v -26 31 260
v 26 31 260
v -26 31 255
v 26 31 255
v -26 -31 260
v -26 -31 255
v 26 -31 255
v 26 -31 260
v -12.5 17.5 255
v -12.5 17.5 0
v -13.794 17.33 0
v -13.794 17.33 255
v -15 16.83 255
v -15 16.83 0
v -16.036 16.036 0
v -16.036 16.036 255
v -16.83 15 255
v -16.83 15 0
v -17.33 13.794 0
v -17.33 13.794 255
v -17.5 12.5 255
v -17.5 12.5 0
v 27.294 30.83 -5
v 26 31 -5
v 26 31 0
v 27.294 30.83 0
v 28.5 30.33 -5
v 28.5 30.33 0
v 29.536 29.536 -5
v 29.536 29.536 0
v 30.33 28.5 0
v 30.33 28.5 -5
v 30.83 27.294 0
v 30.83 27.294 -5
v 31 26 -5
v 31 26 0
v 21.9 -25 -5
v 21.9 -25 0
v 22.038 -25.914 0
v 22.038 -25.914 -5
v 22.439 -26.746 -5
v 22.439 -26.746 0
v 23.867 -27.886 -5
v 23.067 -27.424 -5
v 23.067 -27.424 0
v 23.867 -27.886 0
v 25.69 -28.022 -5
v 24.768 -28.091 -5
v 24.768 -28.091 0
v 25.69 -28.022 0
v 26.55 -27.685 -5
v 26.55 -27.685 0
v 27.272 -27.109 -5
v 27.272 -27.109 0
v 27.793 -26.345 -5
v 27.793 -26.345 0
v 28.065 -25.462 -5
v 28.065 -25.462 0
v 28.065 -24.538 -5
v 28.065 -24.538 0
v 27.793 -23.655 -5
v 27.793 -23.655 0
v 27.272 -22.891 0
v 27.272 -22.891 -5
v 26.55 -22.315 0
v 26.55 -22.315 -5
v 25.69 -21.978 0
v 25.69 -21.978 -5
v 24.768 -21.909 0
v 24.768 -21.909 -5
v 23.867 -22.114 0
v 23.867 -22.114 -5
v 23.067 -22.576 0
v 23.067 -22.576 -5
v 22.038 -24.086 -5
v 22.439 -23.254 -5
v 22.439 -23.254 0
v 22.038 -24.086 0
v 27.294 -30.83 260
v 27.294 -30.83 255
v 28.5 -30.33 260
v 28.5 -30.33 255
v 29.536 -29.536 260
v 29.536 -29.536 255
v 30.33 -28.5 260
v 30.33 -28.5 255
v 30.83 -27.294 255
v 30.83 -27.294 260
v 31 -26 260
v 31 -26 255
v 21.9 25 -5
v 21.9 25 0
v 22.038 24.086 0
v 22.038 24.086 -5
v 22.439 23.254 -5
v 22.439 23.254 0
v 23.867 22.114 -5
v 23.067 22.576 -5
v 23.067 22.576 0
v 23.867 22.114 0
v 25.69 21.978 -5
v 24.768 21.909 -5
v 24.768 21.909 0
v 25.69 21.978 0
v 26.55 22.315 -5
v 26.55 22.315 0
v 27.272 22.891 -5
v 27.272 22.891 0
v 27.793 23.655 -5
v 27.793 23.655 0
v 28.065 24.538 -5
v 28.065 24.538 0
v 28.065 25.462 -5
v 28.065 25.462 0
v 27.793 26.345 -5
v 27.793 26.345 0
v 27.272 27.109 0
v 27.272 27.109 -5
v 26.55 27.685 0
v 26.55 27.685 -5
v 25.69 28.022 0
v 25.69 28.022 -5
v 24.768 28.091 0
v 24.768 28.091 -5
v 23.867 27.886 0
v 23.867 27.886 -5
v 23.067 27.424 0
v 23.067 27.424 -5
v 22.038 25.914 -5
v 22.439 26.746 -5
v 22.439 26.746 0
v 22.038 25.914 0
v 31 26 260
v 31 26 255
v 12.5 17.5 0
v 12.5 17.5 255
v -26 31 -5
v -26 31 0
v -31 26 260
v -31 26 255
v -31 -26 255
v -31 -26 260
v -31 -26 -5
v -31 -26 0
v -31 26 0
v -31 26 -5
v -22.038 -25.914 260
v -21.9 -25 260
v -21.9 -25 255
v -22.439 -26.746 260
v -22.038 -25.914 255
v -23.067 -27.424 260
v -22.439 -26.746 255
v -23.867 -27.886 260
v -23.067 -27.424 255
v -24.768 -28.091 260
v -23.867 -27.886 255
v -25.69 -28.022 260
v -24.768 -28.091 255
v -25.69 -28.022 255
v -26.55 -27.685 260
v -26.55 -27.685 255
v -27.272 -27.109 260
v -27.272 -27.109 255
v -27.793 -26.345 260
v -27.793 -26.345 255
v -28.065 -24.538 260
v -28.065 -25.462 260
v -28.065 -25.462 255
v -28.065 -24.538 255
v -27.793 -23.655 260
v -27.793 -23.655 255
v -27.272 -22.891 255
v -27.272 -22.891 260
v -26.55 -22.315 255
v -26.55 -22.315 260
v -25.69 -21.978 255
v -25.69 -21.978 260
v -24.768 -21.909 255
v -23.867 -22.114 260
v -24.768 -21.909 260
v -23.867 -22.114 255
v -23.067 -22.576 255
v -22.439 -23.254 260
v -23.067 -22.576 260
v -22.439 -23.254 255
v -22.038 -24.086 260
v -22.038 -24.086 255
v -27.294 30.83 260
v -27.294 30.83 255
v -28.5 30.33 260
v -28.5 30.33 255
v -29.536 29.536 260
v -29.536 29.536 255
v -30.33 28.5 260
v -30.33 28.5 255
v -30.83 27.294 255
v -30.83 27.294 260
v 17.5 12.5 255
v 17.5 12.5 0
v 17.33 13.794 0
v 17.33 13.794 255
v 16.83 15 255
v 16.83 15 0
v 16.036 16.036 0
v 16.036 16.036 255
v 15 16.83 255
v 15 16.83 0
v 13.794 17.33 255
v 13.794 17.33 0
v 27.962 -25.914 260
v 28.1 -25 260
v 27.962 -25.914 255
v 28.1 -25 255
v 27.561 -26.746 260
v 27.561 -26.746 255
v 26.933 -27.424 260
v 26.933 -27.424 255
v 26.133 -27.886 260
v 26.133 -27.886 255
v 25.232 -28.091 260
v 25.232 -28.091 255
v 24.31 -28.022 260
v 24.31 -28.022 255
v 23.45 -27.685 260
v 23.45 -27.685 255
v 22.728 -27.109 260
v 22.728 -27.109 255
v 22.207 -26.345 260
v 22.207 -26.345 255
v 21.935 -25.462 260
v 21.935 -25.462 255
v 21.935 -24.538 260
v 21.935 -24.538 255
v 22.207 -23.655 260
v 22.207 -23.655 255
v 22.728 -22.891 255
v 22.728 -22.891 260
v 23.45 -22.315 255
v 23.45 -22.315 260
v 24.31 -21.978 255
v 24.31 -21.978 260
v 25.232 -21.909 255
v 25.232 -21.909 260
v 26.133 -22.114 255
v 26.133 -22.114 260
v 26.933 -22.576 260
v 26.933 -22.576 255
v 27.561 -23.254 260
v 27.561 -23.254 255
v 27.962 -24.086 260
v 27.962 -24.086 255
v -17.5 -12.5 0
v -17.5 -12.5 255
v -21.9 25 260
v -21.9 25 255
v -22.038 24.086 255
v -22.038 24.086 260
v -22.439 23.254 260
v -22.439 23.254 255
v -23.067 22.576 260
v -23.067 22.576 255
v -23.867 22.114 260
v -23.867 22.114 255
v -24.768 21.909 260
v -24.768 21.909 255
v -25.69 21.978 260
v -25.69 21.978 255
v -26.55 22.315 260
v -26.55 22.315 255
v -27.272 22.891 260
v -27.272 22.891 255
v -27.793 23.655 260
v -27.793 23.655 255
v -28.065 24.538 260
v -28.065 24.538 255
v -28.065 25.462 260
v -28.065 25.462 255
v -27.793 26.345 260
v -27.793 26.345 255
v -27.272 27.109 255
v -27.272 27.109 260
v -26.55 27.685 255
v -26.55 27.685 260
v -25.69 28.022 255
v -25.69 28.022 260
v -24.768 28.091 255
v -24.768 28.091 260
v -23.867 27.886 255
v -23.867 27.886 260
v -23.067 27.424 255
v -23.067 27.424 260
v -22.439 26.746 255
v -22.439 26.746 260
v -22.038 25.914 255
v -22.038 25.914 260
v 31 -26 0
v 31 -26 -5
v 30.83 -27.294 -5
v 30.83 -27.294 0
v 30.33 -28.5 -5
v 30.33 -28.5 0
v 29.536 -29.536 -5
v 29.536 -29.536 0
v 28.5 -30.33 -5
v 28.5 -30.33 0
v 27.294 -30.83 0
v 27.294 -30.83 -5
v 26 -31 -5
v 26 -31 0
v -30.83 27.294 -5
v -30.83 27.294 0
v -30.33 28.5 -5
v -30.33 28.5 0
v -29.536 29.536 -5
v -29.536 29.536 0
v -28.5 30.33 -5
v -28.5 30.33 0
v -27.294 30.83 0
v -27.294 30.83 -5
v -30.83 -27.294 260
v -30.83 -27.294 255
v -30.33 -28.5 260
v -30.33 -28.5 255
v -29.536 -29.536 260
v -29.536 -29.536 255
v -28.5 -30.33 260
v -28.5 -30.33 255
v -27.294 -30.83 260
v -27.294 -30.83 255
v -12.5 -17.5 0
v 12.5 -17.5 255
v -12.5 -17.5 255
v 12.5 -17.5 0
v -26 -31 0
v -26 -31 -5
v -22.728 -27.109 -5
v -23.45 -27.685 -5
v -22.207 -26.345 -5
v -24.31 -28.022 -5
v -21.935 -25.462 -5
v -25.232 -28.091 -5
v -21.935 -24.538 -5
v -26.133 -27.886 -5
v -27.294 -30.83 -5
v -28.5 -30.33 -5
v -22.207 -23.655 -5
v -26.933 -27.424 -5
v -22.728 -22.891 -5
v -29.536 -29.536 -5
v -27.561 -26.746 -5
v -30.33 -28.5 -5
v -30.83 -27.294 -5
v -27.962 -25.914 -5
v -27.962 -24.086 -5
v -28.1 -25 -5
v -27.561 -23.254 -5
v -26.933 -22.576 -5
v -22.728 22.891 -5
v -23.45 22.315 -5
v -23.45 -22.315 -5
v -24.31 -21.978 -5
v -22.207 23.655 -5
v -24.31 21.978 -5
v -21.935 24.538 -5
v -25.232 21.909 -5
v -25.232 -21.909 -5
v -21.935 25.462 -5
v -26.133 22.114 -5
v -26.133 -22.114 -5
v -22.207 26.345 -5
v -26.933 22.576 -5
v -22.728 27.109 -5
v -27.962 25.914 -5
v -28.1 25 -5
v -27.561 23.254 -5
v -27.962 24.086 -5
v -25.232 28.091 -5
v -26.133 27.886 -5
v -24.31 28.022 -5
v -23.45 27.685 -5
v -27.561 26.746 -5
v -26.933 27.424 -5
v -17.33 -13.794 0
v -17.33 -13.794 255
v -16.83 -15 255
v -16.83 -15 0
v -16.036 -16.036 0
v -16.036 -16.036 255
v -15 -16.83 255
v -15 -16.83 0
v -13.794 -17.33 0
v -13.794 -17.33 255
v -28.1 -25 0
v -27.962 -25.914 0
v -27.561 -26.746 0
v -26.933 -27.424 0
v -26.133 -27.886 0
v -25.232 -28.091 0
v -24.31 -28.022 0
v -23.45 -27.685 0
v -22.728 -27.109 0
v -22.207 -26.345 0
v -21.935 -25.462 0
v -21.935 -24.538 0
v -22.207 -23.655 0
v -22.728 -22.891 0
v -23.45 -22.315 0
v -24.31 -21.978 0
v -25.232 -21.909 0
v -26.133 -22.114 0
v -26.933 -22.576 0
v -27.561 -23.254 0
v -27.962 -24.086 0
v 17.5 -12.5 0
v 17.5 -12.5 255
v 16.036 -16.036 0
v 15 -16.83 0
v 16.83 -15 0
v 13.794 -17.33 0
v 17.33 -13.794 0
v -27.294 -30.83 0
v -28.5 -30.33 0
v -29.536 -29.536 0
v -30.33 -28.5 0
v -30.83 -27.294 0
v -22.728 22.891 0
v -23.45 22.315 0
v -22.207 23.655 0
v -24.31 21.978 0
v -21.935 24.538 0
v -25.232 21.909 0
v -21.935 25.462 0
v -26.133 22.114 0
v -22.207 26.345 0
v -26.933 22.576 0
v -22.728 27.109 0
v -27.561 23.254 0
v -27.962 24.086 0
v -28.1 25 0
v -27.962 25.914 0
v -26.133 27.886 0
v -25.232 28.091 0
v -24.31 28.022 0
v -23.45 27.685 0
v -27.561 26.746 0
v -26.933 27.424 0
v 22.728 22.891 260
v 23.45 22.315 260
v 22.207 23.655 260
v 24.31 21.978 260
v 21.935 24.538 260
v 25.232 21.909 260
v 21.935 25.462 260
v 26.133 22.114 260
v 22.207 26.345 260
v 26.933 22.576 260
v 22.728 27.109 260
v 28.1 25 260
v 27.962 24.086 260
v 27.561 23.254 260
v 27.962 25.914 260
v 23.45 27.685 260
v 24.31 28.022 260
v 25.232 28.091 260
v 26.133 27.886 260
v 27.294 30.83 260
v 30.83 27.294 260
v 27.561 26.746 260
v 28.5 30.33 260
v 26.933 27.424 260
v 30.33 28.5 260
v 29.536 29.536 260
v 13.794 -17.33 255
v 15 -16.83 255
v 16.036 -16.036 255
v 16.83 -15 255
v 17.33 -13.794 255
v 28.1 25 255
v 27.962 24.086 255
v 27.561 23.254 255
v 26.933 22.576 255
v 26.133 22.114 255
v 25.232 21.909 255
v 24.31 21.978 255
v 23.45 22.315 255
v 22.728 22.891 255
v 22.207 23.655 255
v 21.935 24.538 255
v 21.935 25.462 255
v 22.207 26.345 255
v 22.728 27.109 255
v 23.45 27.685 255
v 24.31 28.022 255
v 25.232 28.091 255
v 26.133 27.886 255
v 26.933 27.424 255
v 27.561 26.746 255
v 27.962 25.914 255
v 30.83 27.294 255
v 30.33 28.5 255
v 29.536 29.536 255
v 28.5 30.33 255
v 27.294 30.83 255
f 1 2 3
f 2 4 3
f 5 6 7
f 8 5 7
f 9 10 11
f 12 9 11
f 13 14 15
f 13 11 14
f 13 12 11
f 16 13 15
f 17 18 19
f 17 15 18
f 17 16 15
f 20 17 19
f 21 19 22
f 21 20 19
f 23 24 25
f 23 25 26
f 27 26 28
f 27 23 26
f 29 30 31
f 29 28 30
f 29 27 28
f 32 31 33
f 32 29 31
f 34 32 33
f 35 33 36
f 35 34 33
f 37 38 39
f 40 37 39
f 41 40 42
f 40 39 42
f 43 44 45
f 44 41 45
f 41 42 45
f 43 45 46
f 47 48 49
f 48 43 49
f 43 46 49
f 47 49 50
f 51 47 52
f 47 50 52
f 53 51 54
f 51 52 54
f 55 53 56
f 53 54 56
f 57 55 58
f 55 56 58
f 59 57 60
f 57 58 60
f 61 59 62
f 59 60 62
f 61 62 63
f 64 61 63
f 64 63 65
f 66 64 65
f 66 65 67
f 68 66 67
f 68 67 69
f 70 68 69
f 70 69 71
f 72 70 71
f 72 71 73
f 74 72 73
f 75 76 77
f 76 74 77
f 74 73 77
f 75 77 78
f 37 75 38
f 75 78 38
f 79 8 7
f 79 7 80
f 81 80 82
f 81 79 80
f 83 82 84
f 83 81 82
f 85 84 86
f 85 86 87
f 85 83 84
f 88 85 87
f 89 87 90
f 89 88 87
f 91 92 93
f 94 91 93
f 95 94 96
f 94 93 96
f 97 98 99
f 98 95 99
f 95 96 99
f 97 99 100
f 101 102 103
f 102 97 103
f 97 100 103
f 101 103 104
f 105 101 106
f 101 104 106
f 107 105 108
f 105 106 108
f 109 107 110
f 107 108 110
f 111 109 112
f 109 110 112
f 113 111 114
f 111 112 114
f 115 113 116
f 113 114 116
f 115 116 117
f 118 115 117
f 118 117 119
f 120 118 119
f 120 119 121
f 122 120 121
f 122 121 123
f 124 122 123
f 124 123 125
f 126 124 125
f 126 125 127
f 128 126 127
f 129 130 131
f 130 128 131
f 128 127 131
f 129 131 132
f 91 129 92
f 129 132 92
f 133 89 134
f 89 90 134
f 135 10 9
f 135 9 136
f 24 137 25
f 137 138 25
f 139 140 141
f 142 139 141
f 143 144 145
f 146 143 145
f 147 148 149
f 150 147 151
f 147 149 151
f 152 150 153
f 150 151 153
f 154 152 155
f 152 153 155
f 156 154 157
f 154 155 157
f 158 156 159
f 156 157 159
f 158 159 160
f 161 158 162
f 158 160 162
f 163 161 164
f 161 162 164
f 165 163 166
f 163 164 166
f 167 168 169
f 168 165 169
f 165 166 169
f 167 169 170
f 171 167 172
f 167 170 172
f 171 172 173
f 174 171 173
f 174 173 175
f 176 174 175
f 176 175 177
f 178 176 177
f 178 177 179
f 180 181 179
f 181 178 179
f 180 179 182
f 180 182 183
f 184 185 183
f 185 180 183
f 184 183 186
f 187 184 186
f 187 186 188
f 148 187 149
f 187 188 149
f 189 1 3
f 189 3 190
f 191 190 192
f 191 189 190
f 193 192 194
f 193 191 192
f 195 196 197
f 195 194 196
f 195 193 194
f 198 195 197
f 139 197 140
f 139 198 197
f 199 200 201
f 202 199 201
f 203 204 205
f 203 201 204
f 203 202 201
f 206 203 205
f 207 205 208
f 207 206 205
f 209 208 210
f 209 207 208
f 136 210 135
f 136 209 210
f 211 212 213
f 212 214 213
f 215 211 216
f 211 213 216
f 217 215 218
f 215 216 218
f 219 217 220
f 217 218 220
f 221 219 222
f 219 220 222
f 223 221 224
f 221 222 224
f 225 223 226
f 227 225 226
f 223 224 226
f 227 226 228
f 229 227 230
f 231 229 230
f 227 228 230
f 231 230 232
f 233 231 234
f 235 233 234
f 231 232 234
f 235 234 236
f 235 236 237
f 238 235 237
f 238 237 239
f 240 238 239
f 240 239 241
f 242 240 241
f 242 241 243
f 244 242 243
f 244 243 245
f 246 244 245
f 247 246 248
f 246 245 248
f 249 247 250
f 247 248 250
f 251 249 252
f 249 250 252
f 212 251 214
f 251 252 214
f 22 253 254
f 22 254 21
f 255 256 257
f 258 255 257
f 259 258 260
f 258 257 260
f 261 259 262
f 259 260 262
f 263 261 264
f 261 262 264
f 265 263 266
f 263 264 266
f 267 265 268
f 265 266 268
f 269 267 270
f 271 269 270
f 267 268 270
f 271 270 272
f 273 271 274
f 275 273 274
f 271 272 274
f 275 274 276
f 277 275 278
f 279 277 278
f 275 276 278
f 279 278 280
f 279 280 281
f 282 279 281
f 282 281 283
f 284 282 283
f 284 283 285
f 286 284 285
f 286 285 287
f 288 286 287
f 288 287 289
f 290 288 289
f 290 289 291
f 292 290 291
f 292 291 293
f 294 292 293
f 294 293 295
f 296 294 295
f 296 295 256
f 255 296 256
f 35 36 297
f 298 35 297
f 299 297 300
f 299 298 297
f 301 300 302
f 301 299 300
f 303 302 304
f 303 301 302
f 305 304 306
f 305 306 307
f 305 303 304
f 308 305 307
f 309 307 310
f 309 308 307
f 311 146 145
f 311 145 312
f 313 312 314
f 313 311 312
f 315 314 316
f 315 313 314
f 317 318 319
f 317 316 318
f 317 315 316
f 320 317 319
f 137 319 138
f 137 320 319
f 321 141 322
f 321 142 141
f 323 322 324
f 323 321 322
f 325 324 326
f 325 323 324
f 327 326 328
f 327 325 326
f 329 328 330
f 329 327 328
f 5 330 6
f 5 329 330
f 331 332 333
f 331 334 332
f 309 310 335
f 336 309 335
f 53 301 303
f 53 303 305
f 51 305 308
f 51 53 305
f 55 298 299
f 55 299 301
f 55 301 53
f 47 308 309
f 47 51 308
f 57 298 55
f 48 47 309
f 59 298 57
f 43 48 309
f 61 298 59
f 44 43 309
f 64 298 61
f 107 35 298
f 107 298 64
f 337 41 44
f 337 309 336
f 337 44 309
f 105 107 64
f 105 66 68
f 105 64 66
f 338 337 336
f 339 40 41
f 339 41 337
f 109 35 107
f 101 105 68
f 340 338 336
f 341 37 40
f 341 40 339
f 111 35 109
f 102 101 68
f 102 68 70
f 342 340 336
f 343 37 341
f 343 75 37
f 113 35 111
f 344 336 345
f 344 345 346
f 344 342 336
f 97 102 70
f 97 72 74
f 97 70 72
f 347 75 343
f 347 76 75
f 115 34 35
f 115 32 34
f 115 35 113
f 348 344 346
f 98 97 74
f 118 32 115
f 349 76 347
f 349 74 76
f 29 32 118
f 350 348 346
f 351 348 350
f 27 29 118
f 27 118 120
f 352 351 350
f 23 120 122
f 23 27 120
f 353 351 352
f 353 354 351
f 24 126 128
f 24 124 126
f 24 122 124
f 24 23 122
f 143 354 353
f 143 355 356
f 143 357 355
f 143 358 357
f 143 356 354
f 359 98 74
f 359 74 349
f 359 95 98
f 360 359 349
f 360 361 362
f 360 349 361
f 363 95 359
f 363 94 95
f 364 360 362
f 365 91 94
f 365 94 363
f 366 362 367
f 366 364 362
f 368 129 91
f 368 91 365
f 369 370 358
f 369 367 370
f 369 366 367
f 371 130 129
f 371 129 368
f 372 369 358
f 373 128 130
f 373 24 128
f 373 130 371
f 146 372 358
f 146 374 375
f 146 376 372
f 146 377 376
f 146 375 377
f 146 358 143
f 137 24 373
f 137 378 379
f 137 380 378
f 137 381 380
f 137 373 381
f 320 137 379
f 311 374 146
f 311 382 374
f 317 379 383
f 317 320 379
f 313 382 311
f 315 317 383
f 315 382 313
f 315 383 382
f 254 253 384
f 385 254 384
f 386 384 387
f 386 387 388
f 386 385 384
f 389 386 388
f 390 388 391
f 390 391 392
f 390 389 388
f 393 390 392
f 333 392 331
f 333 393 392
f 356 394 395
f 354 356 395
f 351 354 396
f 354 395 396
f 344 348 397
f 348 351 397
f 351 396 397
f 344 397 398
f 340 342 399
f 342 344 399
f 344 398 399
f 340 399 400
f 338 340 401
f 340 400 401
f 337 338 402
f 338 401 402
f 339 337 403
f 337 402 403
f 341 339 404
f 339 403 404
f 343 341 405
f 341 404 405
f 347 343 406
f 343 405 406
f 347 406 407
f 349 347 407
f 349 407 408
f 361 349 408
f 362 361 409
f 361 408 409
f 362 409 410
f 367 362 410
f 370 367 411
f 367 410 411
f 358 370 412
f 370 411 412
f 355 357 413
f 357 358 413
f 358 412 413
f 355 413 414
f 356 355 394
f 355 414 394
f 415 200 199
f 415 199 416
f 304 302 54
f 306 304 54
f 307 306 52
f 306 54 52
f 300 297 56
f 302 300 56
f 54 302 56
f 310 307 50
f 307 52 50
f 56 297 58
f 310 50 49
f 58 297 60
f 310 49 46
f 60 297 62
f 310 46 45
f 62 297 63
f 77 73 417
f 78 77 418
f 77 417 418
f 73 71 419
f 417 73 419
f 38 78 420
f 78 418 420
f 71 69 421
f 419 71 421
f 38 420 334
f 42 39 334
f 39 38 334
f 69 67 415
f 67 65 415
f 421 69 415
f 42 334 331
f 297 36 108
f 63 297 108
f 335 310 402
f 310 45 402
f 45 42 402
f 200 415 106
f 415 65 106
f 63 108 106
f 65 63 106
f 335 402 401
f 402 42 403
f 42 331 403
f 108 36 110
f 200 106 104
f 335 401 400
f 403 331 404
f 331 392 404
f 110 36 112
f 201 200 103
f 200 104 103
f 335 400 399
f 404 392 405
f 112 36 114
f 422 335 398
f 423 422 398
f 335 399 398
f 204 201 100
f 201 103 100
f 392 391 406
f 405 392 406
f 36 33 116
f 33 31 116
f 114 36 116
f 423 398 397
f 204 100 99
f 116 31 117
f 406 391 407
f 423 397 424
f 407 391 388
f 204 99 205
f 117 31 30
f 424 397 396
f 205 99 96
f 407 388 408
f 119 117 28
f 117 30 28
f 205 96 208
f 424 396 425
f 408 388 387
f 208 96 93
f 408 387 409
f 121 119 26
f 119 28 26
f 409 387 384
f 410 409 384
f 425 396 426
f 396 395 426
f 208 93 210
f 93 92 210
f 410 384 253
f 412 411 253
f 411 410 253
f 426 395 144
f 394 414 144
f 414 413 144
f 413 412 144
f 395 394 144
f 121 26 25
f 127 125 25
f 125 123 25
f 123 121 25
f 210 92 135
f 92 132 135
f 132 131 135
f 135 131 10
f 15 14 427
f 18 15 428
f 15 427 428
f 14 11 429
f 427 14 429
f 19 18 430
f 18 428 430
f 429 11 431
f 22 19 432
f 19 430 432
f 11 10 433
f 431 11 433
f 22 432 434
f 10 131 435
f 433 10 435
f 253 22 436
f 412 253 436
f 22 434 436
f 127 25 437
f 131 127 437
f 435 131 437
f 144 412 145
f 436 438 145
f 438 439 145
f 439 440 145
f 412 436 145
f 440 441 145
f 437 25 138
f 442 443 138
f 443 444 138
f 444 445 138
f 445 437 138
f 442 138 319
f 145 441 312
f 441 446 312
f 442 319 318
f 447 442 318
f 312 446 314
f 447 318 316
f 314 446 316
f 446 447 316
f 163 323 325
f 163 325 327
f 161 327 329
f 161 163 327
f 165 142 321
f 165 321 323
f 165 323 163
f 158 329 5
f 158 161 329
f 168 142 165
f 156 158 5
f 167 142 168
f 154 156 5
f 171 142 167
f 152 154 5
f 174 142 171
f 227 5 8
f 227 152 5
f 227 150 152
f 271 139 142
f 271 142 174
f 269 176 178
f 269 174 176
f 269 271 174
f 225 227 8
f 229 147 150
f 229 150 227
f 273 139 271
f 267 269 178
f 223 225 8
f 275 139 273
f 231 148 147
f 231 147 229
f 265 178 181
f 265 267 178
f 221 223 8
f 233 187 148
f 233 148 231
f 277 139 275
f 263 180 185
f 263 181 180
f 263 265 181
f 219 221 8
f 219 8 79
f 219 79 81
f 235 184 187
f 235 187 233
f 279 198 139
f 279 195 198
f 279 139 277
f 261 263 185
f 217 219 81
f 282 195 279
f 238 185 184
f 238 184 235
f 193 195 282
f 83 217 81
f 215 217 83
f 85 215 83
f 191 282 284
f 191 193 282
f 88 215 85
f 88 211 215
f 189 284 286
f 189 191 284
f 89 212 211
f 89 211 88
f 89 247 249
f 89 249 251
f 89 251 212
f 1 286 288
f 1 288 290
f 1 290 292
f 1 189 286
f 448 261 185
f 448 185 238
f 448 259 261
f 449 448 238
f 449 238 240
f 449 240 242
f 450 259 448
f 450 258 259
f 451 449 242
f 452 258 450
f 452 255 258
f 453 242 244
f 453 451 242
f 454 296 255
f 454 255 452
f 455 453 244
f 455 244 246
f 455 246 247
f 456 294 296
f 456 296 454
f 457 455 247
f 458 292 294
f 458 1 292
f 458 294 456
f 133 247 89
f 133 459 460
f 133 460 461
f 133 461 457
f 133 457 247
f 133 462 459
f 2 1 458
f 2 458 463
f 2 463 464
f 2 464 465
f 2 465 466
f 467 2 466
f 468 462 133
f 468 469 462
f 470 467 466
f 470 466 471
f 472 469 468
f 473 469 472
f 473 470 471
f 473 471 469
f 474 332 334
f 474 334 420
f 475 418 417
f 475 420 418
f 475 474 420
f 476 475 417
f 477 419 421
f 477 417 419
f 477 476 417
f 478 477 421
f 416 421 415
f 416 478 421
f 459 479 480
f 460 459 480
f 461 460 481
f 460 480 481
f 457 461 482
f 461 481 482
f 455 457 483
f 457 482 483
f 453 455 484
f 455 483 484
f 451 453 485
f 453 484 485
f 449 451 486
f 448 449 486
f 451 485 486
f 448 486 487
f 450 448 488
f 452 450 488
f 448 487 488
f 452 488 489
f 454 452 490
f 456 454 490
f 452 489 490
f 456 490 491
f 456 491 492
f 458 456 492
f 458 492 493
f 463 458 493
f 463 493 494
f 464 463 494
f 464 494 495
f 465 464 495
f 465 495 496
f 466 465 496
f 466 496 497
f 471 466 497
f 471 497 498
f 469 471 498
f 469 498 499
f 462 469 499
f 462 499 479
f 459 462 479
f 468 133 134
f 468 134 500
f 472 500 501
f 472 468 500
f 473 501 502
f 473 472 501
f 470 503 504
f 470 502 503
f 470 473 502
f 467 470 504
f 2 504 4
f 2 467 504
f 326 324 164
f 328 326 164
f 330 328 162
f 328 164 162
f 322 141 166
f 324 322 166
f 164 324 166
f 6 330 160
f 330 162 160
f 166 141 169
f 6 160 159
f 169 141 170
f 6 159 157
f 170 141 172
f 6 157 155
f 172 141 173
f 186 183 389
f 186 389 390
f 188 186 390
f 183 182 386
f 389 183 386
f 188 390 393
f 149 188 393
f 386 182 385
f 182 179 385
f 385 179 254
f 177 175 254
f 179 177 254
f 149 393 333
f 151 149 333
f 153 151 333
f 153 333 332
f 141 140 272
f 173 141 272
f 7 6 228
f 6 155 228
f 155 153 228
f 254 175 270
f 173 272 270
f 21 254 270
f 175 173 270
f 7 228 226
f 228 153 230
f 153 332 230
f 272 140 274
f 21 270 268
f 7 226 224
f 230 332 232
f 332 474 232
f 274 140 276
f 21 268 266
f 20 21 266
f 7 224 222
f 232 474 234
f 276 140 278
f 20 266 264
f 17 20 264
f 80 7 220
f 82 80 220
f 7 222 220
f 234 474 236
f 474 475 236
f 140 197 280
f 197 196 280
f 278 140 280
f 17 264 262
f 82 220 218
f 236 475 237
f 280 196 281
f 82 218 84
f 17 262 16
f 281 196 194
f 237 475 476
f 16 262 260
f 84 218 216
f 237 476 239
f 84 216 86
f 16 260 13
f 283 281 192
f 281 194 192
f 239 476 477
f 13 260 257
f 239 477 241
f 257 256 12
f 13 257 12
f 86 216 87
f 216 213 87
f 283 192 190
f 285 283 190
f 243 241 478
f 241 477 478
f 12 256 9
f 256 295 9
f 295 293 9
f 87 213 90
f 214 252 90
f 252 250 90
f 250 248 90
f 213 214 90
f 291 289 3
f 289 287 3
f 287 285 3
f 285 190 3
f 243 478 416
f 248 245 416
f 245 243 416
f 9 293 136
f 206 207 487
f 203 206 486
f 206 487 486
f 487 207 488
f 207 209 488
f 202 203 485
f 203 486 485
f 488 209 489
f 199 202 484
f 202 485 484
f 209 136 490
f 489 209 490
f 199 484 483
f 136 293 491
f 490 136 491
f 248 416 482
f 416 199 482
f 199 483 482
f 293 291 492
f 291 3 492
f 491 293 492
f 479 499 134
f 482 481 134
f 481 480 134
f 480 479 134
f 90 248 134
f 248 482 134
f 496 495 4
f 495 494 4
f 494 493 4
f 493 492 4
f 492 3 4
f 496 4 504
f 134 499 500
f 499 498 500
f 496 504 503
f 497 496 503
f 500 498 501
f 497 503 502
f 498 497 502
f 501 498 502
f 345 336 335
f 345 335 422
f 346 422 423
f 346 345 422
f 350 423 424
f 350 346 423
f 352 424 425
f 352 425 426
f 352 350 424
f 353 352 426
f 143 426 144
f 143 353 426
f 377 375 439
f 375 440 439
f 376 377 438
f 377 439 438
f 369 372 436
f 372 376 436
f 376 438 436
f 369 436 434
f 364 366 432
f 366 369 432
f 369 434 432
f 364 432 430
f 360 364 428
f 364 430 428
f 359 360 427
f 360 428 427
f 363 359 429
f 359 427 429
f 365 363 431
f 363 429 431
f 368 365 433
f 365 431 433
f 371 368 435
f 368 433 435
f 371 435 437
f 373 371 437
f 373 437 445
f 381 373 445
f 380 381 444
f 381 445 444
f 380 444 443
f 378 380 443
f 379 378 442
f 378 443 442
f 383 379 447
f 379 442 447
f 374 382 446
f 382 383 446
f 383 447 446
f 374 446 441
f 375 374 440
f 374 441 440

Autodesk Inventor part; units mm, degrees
ref_plane "YZ Plane" through (0, 0, 0) normal (1, 0, 0) x (0, 1, 0)
ref_plane "XZ Plane" through (0, 0, 0) normal (0, 1, 0) x (-1, 0, 0)
ref_plane "XY Plane" through (0, 0, 0) normal (0, 0, 1) x (1, 0, 0)
sketch "스케치1" plane through (0, 0, 0) normal (0, 0, 1) x (1, 0, 0)
  line L0 (-17.5, 17.5) -> (17.5, 17.5)
  line L1 (17.5, 17.5) -> (17.5, -17.5)
  line L2 (17.5, -17.5) -> (-17.5, -17.5)
  line L3 (-17.5, -17.5) -> (-17.5, 17.5)
  line L4 (-17.5, 17.5) -> (17.5, -17.5) construction
  line L5 (17.5, 17.5) -> (-17.5, -17.5) construction
  point P0 (0, 0)
  dimension "d0" = 35
  dimension "d1" = 35
extrude "돌출1" add sketch "스케치1" along normal blind 255
sketch "스케치2" plane through (0, 0, 255) normal (0, 0, 1) x (1, 0, 0)
  line L0 (-25, -25) -> (25, -25)
  line L1 (25, -25) -> (25, 25)
  line L2 (25, 25) -> (-25, 25)
  line L3 (-25, 25) -> (-25, -25)
  line L4 (-25, -25) -> (25, 25) construction
  line L5 (25, -25) -> (-25, 25) construction
  circle A0 centre (25, 25) radius 3.1
  circle A1 centre (-25, 25) radius 3.1
  circle A2 centre (-25, -25) radius 3.1
  circle A3 centre (25, -25) radius 3.1
  line L6 (-31, -31) -> (31, -31)
  line L7 (31, -31) -> (31, 31)
  line L8 (31, 31) -> (-31, 31)
  line L9 (-31, 31) -> (-31, -31)
  line L10 (-31, -31) -> (31, 31) construction
  line L11 (31, -31) -> (-31, 31) construction
  point P0 (0, 0)
  dimension "d4" = 50
  dimension "d5" = 50
  dimension "d6" = 6.2
  dimension "d9" = 360
  dimension "d11" = 62
  dimension "d12" = 62
extrude "돌출2" add sketch "스케치2" along normal blind 5 contours A2 L3 A1 L2 A0 L1 A3 L0 | L9 L8 L7 L6
sketch "스케치3" plane through (0, 0, 0) normal (0, 0, -1) x (-1, 0, 0)
  line L0 (-31, -31) -> (31, -31)
  line L1 (31, -31) -> (31, 31)
  line L2 (31, 31) -> (-31, 31)
  line L3 (-31, 31) -> (-31, -31)
  line L4 (-31, -31) -> (31, 31) construction
  line L5 (31, -31) -> (-31, 31) construction
  circle A0 centre (25, 25) radius 3.1 projected
  circle A1 centre (25, 25) radius 3.1
  circle A2 centre (-25, 25) radius 3.1
  circle A3 centre (-25, -25) radius 3.1
  circle A4 centre (25, -25) radius 3.1
  point P0 (0, 0)
  dimension "d17" = 360
extrude "돌출3" add sketch "스케치3" along normal blind 5
fillet "모깎기1" radius 5 12 edges at (17.5, 17.5, 127.5) (17.5, -17.5, 127.5) (-17.5, 17.5, 127.5) (31, 31, -2.5) (31, -31, -2.5) (-17.5, -17.5, 127.5) (-31, -31, -2.5) (-31, 31, -2.5) (-31, -31, 257.5) (-31, 31, 257.5) (31, -31, 257.5) (31, 31, 257.5)
properties part number "post"
